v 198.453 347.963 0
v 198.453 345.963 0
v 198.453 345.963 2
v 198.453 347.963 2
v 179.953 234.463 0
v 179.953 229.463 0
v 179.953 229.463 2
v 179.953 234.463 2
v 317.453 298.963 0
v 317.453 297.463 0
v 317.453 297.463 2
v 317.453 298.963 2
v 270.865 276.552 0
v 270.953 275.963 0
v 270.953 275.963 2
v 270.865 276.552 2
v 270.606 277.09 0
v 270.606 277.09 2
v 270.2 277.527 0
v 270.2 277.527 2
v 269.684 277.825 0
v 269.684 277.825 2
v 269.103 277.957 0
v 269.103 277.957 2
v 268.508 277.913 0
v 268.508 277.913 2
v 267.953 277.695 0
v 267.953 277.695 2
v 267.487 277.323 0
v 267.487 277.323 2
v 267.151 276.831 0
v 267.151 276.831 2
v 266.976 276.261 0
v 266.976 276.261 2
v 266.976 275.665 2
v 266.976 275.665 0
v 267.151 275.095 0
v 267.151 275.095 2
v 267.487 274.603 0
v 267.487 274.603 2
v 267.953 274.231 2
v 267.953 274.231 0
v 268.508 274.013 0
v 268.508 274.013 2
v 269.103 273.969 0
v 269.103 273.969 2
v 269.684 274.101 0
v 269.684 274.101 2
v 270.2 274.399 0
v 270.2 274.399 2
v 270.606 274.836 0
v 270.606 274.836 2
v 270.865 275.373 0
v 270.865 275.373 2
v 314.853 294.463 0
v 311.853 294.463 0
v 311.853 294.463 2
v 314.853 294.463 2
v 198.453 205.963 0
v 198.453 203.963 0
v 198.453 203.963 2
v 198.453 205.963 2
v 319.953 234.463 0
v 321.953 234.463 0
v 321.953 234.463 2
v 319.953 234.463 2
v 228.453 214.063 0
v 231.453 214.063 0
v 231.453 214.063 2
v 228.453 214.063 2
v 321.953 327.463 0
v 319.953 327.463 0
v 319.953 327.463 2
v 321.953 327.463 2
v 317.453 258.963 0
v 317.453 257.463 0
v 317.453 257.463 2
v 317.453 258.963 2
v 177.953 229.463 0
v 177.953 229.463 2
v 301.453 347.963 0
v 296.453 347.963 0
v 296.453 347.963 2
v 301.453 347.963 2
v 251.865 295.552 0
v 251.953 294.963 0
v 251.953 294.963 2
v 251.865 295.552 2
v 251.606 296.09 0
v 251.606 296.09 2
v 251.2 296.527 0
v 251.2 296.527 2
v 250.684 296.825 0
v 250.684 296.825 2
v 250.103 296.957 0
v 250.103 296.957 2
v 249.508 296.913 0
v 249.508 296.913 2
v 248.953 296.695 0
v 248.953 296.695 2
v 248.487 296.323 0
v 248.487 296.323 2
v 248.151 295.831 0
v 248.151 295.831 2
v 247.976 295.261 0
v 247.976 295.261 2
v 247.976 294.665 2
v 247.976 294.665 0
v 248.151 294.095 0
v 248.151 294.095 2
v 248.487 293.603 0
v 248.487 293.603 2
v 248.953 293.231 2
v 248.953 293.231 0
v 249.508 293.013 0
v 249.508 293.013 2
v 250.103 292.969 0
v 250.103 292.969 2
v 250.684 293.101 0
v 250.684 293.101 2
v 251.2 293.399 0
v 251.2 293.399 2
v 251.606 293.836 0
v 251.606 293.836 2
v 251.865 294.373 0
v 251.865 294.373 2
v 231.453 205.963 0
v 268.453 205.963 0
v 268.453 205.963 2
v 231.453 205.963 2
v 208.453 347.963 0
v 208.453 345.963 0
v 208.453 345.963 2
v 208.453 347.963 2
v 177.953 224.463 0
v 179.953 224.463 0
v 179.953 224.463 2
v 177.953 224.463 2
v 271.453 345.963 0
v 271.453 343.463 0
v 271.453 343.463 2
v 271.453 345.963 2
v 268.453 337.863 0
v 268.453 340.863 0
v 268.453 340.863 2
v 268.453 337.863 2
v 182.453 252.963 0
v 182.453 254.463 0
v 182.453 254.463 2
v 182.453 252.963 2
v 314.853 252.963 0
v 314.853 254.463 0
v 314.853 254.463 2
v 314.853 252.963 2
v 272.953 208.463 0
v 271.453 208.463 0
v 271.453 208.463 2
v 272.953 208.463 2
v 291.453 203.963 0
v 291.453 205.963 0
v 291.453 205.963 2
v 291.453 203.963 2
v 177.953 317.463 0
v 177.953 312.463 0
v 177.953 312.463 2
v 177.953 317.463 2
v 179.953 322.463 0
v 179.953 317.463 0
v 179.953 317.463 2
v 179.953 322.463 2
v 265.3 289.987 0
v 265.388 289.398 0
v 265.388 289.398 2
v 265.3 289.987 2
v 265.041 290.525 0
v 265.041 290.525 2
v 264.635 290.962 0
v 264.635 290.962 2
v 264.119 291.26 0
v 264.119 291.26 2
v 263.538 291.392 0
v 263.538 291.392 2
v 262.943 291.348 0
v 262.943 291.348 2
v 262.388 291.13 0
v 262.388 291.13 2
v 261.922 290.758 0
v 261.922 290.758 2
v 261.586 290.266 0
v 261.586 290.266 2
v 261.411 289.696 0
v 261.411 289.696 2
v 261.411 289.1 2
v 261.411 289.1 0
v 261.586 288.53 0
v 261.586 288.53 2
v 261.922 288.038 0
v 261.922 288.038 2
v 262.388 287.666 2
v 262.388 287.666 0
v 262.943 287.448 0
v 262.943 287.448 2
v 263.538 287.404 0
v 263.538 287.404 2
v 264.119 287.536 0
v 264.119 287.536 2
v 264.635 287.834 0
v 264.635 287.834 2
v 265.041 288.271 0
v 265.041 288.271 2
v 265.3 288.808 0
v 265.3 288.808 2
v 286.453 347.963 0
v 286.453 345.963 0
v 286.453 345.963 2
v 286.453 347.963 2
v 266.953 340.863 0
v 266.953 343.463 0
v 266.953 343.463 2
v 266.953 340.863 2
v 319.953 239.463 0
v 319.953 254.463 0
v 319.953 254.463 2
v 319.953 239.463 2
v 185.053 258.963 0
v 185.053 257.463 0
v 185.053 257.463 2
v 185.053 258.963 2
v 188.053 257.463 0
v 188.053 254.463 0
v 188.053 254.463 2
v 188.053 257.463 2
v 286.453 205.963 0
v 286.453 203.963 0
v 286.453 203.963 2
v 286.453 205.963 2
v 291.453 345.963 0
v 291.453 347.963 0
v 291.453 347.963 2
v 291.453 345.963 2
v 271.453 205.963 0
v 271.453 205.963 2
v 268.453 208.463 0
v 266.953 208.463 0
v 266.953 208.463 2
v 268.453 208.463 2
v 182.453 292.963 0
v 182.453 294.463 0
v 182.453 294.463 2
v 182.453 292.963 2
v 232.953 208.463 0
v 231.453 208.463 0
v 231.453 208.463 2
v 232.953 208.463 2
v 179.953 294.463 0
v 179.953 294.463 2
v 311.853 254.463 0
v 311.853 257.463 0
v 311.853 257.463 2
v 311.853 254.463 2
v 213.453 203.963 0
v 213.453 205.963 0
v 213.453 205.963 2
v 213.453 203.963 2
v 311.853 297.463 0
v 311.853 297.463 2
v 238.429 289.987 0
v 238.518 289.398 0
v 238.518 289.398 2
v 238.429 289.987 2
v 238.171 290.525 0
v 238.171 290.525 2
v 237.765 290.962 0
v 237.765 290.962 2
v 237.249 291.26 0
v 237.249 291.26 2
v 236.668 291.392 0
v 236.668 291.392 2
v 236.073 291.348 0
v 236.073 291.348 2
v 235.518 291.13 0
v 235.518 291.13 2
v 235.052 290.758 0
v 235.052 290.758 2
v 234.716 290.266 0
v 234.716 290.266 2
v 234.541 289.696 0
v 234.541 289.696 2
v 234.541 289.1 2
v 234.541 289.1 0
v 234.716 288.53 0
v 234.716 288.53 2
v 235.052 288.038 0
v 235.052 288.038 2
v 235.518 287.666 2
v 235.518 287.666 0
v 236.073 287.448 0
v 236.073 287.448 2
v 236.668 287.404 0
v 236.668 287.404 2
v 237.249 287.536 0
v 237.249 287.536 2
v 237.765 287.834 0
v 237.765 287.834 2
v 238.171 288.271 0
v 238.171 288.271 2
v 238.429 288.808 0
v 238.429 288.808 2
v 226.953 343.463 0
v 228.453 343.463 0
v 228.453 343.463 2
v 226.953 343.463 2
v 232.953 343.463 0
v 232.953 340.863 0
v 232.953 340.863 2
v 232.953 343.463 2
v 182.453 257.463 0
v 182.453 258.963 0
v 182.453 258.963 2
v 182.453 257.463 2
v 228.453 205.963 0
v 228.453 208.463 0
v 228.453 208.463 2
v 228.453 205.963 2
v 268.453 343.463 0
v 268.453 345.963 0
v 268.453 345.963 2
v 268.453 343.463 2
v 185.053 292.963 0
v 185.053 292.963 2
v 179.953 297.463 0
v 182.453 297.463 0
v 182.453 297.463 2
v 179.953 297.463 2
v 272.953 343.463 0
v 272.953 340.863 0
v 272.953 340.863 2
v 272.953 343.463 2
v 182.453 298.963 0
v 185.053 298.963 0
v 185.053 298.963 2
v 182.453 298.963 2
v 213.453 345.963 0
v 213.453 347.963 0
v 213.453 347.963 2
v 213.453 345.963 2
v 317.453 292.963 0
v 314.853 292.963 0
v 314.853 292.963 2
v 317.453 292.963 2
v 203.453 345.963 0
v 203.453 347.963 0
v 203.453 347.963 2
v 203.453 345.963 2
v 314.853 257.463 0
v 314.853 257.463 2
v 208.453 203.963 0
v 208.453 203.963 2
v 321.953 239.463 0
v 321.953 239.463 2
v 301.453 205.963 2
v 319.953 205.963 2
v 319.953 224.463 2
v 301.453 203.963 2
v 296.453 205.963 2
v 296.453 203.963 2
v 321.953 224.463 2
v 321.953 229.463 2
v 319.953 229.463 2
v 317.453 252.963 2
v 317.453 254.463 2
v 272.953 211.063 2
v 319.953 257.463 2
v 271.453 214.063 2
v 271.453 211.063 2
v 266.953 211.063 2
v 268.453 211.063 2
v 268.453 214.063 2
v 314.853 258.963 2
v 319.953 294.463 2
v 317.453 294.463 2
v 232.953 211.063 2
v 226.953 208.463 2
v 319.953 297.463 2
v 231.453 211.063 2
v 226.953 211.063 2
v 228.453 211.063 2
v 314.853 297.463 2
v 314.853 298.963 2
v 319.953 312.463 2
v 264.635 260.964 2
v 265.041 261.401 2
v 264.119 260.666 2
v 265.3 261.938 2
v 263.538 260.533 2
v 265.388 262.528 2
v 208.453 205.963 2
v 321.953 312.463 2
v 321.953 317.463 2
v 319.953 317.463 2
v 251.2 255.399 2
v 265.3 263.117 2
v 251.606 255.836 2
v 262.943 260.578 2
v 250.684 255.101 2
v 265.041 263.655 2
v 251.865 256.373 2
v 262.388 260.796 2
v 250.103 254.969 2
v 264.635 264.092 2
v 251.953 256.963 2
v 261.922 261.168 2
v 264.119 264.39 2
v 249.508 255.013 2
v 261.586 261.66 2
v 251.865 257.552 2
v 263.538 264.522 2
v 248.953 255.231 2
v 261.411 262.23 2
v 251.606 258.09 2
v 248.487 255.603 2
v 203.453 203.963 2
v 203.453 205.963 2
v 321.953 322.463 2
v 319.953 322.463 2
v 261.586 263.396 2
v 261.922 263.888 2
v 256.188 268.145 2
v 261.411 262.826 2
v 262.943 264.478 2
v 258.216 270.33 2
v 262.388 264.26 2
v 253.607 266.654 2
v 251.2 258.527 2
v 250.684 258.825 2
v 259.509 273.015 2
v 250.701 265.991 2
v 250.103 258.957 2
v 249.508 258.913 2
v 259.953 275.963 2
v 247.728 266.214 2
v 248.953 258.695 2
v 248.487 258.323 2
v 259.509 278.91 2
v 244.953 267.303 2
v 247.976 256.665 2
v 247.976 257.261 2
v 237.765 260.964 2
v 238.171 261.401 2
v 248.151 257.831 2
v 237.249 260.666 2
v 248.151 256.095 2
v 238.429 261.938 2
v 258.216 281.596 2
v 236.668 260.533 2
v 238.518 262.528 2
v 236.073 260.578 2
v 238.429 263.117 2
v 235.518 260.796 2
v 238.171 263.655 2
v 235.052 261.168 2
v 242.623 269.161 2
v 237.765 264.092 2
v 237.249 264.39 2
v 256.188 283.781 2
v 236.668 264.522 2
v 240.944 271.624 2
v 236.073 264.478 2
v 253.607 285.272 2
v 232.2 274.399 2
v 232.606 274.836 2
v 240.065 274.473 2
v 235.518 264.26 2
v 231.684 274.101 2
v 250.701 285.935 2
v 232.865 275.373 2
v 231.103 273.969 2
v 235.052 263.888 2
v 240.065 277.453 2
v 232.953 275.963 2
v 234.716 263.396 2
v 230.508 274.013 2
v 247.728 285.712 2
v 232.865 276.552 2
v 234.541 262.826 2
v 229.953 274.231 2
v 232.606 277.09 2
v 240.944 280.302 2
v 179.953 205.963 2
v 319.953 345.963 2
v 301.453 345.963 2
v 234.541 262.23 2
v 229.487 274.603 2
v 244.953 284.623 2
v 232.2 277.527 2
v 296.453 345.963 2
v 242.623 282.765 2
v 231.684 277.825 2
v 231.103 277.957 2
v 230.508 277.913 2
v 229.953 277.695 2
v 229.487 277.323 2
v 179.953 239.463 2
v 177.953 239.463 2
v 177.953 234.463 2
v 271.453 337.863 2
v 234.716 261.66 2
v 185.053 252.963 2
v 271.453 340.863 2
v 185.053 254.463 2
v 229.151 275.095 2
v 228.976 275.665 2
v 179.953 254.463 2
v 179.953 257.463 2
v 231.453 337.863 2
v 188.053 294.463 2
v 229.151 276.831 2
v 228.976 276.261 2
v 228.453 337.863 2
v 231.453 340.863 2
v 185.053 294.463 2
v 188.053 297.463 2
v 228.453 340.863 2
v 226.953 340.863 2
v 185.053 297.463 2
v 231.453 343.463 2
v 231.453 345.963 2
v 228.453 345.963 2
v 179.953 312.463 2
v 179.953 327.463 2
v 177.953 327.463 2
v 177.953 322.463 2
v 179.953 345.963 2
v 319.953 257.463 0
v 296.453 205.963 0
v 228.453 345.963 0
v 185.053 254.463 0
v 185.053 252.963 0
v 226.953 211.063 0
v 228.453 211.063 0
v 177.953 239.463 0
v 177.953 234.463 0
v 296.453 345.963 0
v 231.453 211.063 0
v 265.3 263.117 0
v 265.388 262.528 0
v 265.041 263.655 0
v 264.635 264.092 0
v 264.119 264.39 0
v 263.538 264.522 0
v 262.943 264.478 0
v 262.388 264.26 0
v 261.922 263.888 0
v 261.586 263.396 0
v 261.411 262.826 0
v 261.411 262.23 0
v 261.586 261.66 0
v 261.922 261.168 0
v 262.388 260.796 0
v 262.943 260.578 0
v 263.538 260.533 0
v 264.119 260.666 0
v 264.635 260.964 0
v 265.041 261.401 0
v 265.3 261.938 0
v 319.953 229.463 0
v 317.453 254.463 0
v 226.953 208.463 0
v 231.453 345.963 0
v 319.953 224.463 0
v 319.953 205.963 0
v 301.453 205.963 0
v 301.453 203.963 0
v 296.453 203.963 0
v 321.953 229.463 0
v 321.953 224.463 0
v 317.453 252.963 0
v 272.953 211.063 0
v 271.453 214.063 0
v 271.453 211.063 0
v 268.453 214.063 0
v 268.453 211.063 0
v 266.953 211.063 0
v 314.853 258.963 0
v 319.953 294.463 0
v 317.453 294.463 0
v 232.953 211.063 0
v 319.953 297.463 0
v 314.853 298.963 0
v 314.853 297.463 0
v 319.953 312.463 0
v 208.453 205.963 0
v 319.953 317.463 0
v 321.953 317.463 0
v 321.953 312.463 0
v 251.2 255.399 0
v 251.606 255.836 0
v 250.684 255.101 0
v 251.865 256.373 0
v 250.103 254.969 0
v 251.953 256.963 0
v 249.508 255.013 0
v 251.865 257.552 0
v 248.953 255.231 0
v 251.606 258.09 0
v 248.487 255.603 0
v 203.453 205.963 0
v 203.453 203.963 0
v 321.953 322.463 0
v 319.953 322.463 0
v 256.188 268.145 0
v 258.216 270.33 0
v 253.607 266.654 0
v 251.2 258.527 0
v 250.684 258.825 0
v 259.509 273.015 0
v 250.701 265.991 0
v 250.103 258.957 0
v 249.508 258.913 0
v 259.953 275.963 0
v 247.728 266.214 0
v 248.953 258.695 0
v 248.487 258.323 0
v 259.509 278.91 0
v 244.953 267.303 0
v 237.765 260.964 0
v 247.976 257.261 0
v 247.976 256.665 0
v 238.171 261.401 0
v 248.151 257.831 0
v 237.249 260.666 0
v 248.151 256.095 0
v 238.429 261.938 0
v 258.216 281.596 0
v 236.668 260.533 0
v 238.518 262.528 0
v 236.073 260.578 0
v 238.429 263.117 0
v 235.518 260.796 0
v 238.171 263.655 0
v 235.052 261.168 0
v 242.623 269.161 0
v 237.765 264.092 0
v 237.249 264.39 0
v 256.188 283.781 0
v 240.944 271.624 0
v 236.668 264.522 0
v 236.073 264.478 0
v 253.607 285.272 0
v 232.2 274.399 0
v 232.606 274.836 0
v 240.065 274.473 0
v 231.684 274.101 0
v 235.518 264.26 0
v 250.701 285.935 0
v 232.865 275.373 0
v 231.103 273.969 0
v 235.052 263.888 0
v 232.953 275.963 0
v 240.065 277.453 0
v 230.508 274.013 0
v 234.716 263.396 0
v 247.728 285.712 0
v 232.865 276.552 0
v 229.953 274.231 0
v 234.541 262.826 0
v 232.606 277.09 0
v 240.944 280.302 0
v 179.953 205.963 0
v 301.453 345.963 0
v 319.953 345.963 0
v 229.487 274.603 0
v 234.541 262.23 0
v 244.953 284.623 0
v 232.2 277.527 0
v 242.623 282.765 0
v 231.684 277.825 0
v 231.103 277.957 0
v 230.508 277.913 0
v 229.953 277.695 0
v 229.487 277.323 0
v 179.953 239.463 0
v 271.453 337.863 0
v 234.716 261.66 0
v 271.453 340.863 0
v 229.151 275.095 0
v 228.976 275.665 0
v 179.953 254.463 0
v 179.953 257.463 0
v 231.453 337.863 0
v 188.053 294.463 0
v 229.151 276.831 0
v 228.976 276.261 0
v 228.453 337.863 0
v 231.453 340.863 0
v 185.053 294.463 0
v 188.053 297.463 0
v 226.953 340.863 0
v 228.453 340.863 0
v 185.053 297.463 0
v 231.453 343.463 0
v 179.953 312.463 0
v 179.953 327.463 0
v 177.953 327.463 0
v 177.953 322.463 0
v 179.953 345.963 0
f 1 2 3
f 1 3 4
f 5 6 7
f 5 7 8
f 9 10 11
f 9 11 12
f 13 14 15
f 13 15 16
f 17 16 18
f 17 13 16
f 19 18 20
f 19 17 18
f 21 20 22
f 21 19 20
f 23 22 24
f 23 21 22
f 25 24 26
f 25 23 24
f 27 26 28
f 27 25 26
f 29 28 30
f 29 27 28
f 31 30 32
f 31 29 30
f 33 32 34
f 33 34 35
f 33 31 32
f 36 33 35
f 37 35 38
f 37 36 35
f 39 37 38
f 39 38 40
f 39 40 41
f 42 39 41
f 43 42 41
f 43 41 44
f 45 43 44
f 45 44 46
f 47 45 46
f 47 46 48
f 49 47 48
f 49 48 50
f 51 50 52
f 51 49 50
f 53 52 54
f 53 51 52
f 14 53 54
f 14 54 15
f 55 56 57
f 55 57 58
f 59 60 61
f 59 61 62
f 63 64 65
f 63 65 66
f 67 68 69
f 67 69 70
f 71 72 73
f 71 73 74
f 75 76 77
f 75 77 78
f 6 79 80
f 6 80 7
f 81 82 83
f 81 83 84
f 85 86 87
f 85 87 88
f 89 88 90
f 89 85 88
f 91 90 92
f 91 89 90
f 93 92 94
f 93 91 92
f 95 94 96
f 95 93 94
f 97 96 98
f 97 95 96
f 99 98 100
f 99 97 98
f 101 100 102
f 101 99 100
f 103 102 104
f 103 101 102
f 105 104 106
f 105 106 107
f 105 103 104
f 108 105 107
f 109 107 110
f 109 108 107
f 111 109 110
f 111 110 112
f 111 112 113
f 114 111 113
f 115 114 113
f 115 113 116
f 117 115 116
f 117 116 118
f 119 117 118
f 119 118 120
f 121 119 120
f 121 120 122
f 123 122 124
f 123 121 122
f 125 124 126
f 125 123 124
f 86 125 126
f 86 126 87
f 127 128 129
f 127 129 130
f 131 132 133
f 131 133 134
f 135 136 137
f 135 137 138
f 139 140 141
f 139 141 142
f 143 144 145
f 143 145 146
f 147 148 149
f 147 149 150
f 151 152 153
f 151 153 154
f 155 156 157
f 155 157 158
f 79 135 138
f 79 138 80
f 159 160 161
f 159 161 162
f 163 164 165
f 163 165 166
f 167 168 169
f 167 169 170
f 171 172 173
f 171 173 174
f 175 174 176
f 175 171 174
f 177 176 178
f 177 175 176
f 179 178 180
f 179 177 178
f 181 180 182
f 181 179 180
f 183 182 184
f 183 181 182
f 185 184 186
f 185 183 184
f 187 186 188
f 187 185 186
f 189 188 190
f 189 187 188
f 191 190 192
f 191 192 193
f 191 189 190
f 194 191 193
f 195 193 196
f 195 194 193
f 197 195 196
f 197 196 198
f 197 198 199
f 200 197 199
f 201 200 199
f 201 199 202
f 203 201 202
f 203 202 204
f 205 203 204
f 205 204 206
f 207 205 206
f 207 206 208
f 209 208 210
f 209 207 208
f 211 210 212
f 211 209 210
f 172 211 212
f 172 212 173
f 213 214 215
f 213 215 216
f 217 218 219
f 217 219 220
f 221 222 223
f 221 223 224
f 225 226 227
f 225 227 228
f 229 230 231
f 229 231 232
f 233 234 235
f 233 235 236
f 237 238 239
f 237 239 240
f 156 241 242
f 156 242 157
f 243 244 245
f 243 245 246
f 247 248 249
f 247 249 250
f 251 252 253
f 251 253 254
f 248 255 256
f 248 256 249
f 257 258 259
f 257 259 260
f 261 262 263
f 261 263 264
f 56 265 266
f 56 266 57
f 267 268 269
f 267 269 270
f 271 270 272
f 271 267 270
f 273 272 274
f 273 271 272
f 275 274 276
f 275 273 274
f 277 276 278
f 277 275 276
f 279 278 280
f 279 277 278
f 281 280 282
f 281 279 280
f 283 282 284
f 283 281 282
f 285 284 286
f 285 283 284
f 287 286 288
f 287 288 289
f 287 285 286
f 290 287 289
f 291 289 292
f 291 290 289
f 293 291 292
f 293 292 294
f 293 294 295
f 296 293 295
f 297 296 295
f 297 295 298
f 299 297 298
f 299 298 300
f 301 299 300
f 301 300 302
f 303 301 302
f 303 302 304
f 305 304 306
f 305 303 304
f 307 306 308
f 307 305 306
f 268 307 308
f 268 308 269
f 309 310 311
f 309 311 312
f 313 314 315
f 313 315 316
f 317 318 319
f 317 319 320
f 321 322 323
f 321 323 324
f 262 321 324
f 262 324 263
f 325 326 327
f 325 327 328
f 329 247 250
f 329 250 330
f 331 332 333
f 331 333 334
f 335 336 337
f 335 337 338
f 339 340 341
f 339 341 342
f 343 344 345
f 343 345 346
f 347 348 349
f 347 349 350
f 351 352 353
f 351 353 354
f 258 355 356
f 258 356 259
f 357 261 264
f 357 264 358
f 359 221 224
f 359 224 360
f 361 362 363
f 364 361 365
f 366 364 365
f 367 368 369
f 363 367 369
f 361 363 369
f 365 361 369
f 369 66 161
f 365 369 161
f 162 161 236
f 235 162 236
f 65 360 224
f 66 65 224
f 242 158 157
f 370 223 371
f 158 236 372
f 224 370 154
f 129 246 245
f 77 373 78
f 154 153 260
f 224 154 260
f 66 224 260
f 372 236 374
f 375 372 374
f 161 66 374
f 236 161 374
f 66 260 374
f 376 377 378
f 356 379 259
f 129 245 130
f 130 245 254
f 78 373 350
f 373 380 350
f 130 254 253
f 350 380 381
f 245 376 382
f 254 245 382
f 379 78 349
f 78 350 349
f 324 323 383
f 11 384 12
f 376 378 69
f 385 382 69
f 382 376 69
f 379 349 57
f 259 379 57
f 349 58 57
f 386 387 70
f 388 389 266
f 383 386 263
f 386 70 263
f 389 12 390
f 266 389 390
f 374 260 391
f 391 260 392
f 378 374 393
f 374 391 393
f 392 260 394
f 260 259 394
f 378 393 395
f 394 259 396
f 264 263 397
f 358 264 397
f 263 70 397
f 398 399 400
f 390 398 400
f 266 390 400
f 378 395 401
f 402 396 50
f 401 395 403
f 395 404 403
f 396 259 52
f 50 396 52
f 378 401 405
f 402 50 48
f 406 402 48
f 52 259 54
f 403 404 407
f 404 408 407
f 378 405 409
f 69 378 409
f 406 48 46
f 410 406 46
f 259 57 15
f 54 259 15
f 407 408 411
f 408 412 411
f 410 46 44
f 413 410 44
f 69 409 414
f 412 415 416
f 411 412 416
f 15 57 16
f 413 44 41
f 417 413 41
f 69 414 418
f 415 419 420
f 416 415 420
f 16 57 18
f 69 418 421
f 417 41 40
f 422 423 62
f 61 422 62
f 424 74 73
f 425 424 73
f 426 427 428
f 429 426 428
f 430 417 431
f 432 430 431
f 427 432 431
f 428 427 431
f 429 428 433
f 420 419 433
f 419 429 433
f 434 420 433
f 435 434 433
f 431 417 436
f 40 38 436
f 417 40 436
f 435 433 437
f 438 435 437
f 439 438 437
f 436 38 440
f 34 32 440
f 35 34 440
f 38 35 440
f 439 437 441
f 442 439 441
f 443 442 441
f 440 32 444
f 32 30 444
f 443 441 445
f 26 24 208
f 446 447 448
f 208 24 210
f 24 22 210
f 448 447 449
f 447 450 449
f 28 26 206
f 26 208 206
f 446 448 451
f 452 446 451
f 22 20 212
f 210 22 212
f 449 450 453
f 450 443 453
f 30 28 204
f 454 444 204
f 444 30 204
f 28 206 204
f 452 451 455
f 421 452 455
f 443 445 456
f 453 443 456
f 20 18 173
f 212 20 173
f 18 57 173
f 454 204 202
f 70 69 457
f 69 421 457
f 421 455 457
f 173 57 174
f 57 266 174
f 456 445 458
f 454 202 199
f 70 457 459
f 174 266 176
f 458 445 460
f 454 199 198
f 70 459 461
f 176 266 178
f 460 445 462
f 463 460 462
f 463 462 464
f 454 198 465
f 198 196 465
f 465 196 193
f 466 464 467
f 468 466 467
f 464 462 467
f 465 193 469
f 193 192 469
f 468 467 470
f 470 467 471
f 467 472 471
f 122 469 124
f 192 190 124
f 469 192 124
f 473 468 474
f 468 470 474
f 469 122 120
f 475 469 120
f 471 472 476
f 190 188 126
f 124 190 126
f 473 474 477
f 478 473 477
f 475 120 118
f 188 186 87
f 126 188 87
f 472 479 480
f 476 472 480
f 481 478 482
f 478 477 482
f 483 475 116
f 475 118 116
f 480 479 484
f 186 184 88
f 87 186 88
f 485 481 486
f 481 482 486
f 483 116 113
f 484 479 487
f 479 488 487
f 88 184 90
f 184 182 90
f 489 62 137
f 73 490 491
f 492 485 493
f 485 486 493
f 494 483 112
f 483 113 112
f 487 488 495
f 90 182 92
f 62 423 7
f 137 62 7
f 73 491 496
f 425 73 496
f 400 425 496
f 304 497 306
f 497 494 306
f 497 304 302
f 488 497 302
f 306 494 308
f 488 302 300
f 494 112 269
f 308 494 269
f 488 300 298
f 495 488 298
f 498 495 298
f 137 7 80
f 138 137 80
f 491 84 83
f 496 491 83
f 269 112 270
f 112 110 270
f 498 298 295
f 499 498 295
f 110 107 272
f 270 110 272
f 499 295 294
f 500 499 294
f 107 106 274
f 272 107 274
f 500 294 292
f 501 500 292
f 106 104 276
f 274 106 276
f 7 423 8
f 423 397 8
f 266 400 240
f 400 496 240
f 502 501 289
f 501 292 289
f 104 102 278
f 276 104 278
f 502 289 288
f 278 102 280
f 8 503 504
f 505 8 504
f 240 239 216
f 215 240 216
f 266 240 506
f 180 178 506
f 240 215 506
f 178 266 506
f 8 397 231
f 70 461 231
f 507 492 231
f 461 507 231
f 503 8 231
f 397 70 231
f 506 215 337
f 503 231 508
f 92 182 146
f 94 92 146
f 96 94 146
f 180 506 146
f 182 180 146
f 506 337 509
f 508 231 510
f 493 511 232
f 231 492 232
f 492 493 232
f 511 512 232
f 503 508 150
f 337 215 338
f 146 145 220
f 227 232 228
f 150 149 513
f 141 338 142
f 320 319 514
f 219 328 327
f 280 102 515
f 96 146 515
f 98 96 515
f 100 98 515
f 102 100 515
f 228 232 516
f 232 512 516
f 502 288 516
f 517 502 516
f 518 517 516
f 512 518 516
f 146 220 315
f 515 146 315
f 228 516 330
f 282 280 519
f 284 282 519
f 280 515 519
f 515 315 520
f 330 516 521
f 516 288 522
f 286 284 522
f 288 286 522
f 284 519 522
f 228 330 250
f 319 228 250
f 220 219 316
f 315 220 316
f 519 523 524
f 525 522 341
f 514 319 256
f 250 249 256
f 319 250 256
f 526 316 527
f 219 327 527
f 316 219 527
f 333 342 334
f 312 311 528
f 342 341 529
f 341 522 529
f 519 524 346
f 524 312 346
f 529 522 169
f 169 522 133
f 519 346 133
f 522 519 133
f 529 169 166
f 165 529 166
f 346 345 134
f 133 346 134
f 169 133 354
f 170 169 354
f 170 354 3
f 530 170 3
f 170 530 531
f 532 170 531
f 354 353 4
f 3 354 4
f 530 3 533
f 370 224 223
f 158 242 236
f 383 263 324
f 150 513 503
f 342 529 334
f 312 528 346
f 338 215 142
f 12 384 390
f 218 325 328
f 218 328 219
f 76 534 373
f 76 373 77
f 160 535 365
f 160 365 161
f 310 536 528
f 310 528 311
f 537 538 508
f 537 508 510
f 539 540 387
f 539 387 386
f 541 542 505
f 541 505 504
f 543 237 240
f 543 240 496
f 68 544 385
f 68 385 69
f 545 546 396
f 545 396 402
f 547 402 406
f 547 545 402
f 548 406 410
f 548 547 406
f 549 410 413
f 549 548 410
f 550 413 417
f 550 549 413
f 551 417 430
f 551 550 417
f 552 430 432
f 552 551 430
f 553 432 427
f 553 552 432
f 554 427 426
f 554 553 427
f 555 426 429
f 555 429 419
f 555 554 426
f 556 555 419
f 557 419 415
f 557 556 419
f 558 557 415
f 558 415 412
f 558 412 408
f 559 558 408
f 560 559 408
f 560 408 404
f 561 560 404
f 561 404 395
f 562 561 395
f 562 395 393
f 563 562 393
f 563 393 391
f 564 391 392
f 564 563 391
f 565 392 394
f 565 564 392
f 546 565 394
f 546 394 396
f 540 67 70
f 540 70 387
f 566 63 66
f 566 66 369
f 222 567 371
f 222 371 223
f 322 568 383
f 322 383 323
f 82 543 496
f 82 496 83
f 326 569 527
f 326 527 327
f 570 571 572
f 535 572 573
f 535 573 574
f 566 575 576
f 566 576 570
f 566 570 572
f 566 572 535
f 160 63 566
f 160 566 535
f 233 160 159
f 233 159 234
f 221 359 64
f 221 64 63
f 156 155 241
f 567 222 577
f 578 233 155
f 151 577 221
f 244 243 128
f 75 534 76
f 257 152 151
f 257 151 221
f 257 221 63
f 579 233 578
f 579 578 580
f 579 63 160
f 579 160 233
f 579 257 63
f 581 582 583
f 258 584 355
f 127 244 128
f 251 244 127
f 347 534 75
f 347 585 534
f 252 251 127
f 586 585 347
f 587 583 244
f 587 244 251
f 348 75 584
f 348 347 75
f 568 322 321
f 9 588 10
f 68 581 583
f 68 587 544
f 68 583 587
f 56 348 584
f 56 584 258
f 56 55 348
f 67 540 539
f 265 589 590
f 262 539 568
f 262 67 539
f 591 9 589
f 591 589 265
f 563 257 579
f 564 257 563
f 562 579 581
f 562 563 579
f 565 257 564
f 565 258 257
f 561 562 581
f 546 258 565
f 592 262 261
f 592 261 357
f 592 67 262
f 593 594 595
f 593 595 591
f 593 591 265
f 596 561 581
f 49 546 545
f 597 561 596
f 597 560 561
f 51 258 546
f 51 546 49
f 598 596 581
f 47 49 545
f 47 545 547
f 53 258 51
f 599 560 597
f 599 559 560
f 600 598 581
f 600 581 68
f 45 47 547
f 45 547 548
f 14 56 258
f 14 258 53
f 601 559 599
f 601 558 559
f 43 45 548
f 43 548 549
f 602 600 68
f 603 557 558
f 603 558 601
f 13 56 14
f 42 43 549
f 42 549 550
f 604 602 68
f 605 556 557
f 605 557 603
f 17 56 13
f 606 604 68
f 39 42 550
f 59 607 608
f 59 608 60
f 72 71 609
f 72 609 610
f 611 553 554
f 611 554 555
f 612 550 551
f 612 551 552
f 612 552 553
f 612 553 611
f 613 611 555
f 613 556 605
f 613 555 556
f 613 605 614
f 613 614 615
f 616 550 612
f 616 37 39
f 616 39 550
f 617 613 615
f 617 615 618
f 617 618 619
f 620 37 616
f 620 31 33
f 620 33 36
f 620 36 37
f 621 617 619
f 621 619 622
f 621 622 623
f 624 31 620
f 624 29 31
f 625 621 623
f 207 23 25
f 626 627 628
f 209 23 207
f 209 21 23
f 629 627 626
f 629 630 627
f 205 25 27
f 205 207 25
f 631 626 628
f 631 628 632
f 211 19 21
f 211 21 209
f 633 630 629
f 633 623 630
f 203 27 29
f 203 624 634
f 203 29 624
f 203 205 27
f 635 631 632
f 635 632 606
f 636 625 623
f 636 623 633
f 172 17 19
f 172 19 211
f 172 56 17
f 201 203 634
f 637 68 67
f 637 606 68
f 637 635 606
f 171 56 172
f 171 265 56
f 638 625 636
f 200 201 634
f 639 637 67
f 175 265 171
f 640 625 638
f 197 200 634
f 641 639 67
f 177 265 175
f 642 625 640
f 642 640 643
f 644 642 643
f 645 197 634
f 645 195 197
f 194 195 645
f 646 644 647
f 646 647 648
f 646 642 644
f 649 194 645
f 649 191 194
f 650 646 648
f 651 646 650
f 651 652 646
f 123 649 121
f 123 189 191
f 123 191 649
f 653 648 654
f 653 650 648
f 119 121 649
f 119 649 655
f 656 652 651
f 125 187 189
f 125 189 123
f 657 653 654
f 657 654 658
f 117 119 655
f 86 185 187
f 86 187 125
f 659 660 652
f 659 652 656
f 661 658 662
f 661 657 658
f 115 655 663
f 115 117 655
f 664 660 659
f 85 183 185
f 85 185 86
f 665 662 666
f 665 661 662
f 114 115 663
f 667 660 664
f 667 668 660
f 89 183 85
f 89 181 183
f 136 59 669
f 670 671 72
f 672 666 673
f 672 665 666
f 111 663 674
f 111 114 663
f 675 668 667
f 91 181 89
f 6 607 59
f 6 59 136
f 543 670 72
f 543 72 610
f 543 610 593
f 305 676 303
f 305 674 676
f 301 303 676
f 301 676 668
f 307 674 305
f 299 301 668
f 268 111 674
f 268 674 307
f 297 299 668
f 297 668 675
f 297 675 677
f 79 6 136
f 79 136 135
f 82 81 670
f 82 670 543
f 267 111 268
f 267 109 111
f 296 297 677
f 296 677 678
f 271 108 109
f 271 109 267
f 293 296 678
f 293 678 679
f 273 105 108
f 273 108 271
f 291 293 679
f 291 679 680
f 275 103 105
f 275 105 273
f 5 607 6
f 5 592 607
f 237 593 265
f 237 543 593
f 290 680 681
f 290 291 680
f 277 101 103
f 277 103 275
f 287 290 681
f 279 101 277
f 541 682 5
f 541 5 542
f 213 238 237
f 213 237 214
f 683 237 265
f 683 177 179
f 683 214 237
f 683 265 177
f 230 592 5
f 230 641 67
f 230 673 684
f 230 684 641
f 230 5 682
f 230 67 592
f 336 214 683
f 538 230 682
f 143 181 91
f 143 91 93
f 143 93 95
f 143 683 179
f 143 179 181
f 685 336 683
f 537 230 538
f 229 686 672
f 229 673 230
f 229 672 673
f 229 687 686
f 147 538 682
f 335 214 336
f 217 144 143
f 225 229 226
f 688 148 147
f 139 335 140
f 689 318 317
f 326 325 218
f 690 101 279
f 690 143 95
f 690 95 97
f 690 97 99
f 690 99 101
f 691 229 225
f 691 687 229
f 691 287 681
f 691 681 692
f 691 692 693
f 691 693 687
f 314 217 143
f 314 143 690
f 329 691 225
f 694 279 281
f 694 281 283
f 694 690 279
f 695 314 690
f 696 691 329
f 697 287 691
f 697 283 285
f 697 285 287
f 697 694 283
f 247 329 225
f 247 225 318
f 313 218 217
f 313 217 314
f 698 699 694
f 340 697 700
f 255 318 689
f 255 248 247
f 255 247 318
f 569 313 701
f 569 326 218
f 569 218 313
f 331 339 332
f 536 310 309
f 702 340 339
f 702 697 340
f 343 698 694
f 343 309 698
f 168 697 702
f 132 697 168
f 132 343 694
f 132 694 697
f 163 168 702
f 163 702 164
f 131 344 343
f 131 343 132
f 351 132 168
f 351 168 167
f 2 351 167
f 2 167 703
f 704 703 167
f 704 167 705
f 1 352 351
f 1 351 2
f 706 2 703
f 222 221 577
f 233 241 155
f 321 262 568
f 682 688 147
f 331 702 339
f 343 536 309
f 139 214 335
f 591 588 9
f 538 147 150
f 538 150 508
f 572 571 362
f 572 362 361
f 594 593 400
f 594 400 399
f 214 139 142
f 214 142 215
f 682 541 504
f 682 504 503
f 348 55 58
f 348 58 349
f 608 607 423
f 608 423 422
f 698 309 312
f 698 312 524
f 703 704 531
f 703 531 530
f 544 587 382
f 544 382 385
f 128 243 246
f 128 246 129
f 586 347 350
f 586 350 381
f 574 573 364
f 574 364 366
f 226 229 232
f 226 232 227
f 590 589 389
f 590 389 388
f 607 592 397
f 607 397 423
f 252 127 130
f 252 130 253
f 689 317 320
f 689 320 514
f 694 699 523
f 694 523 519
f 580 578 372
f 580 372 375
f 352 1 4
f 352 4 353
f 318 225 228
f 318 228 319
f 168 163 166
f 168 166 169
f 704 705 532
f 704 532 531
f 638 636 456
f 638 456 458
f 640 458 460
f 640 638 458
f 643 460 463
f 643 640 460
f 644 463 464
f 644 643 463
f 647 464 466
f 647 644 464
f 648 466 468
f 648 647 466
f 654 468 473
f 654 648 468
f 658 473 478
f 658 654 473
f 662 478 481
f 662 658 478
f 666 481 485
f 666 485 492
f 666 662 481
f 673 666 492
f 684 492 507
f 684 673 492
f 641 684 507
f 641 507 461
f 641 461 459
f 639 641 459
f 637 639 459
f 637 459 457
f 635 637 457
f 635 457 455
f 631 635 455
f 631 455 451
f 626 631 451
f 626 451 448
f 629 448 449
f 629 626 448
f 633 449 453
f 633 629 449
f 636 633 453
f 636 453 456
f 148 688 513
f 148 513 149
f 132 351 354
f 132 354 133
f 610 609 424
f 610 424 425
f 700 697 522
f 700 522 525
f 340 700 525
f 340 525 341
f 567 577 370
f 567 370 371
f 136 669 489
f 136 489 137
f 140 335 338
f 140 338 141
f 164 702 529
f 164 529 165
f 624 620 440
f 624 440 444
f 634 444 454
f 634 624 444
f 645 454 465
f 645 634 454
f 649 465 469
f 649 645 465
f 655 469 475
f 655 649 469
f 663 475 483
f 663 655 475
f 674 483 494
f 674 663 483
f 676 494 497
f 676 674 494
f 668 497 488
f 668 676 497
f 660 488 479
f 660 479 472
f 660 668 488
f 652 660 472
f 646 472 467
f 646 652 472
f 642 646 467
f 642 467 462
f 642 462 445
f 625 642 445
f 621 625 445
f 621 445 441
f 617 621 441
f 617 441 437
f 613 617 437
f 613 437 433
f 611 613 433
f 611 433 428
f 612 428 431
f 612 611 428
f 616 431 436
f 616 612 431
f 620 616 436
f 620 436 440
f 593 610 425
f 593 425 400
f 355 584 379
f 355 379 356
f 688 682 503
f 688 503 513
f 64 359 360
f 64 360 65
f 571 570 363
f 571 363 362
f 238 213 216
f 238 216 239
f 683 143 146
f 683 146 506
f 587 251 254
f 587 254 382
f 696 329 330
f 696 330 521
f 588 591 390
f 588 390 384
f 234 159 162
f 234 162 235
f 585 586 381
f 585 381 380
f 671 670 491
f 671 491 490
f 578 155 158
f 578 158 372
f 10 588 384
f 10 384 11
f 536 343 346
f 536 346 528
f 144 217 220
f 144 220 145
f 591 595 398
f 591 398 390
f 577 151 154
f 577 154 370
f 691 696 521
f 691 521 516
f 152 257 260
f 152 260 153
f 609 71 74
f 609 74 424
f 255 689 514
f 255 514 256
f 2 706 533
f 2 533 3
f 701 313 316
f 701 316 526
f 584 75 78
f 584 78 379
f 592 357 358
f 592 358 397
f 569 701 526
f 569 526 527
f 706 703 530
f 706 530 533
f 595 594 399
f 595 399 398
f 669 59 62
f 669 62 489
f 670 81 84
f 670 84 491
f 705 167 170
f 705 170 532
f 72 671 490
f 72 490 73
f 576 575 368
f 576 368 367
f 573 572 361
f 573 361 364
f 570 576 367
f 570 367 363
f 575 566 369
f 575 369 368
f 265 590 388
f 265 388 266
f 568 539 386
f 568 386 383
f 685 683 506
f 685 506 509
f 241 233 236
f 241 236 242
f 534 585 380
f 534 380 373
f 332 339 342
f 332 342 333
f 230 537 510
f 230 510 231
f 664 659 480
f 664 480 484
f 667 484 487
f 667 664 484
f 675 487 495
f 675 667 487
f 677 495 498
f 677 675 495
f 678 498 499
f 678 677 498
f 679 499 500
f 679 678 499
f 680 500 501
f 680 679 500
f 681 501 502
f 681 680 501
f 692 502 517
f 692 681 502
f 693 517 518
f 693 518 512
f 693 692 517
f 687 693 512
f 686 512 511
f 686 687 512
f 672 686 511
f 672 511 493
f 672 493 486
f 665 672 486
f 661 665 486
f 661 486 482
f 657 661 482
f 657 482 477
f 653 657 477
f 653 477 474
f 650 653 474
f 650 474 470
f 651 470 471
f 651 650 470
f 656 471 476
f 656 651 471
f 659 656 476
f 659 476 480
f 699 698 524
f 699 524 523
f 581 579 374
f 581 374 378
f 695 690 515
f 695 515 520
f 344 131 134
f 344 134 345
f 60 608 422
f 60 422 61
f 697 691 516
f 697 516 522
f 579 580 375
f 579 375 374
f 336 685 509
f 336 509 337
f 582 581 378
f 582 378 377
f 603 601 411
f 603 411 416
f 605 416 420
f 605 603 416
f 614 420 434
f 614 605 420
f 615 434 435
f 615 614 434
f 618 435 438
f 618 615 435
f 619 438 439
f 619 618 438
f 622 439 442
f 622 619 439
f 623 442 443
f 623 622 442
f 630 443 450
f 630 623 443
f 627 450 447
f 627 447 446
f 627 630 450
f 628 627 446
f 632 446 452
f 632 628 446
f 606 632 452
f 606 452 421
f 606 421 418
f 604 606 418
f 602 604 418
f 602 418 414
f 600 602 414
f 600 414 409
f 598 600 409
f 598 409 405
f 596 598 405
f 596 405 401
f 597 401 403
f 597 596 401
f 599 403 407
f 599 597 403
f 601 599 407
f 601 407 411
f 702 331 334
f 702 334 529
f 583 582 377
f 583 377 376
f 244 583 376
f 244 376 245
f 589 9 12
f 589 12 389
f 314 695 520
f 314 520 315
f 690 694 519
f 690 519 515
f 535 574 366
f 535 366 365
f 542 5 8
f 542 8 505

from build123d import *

# Parameters (mm, degrees)
SKETCH_1_R      = 10
SKETCH_1_R_2    = 2
EXTRUDE_1_DEPTH = 2


with BuildPart() as part:
    # 草图1 → 凸台-拉伸1 (new body)
    with BuildSketch(Plane.XY):
        Polygon((317.453360513, 257.462931603), (317.453360513, 258.962931603), (314.853360513, 258.962931603), (314.853360513, 257.462931603), (311.853360513, 257.462931603), (311.853360513, 254.462931603), (314.853360513, 254.462931603), (314.853360513, 252.962931603), (317.453360513, 252.962931603), (317.453360513, 254.462931603), (319.953360513, 254.462931603), (319.953360513, 239.462931603), (321.953360513, 239.462931603), (321.953360513, 234.462931603), (319.953360513, 234.462931603), (319.953360513, 229.462931603), (321.953360513, 229.462931603), (321.953360513, 224.462931603), (319.953360513, 224.462931603), (319.953360513, 205.962931603), (301.453360513, 205.962931603), (301.453360513, 203.962931603), (296.453360513, 203.962931603), (296.453360513, 205.962931603), (291.453360513, 205.962931603), (291.453360513, 203.962931603), (286.453360513, 203.962931603), (286.453360513, 205.962931603), (271.453360513, 205.962931603), (271.453360513, 208.462931603), (272.953360513, 208.462931603), (272.953360513, 211.062931603), (271.453360513, 211.062931603), (271.453360513, 214.062931603), (268.453360513, 214.062931603), (268.453360513, 211.062931603), (266.953360513, 211.062931603), (266.953360513, 208.462931603), (268.453360513, 208.462931603), (268.453360513, 205.962931603), (231.453360513, 205.962931603), (231.453360513, 208.462931603), (232.953360513, 208.462931603), (232.953360513, 211.062931603), (231.453360513, 211.062931603), (231.453360513, 214.062931603), (228.453360513, 214.062931603), (228.453360513, 211.062931603), (226.953360513, 211.062931603), (226.953360513, 208.462931603), (228.453360513, 208.462931603), (228.453360513, 205.962931603), (213.453360513, 205.962931603), (213.453360513, 203.962931603), (208.453360513, 203.962931603), (208.453360513, 205.962931603), (203.453360513, 205.962931603), (203.453360513, 203.962931603), (198.453360513, 203.962931603), (198.453360513, 205.962931603), (179.953360513, 205.962931603), (179.953360513, 224.462931603), (177.953360513, 224.462931603), (177.953360513, 229.462931603), (179.953360513, 229.462931603), (179.953360513, 234.462931603), (177.953360513, 234.462931603), (177.953360513, 239.462931603), (179.953360513, 239.462931603), (179.953360513, 254.462931603), (182.453360513, 254.462931603), (182.453360513, 252.962931603), (185.053360513, 252.962931603), (185.053360513, 254.462931603), (188.053360513, 254.462931603), (188.053360513, 257.462931603), (185.053360513, 257.462931603), (185.053360513, 258.962931603), (182.453360513, 258.962931603), (182.453360513, 257.462931603), (179.953360513, 257.462931603), (179.953360513, 294.462931603), (182.453360513, 294.462931603), (182.453360513, 292.962931603), (185.053360513, 292.962931603), (185.053360513, 294.462931603), (188.053360513, 294.462931603), (188.053360513, 297.462931603), (185.053360513, 297.462931603), (185.053360513, 298.962931603), (182.453360513, 298.962931603), (182.453360513, 297.462931603), (179.953360513, 297.462931603), (179.953360513, 312.462931603), (177.953360513, 312.462931603), (177.953360513, 317.462931603), (179.953360513, 317.462931603), (179.953360513, 322.462931603), (177.953360513, 322.462931603), (177.953360513, 327.462931603), (179.953360513, 327.462931603), (179.953360513, 345.962931603), (198.453360513, 345.962931603), (198.453360513, 347.962931603), (203.453360513, 347.962931603), (203.453360513, 345.962931603), (208.453360513, 345.962931603), (208.453360513, 347.962931603), (213.453360513, 347.962931603), (213.453360513, 345.962931603), (228.453360513, 345.962931603), (228.453360513, 343.462931603), (226.953360513, 343.462931603), (226.953360513, 340.862931603), (228.453360513, 340.862931603), (228.453360513, 337.862931603), (231.453360513, 337.862931603), (231.453360513, 340.862931603), (232.953360513, 340.862931603), (232.953360513, 343.462931603), (231.453360513, 343.462931603), (231.453360513, 345.962931603), (268.453360513, 345.962931603), (268.453360513, 343.462931603), (266.953360513, 343.462931603), (266.953360513, 340.862931603), (268.453360513, 340.862931603), (268.453360513, 337.862931603), (271.453360513, 337.862931603), (271.453360513, 340.862931603), (272.953360513, 340.862931603), (272.953360513, 343.462931603), (271.453360513, 343.462931603), (271.453360513, 345.962931603), (286.453360513, 345.962931603), (286.453360513, 347.962931603), (291.453360513, 347.962931603), (291.453360513, 345.962931603), (296.453360513, 345.962931603), (296.453360513, 347.962931603), (301.453360513, 347.962931603), (301.453360513, 345.962931603), (319.953360513, 345.962931603), (319.953360513, 327.462931603), (321.953360513, 327.462931603), (321.953360513, 322.462931603), (319.953360513, 322.462931603), (319.953360513, 317.462931603), (321.953360513, 317.462931603), (321.953360513, 312.462931603), (319.953360513, 312.462931603), (319.953360513, 297.462931603), (317.453360513, 297.462931603), (317.453360513, 298.962931603), (314.853360513, 298.962931603), (314.853360513, 297.462931603), (311.853360513, 297.462931603), (311.853360513, 294.462931603), (314.853360513, 294.462931603), (314.853360513, 292.962931603), (317.453360513, 292.962931603), (317.453360513, 294.462931603), (319.953360513, 294.462931603), (319.953360513, 257.462931603), align=None)
        with Locations((249.953360513, 275.962931603)):
            Circle(SKETCH_1_R, mode=Mode.SUBTRACT)
        with Locations((230.953360513, 275.962931603)):
            Circle(SKETCH_1_R_2, mode=Mode.SUBTRACT)
        with Locations((236.518331671, 289.397960445)):
            Circle(SKETCH_1_R_2, mode=Mode.SUBTRACT)
        with Locations((249.953360513, 294.962931603)):
            Circle(SKETCH_1_R_2, mode=Mode.SUBTRACT)
        with Locations((263.388389356, 289.397960445)):
            Circle(SKETCH_1_R_2, mode=Mode.SUBTRACT)
        with Locations((268.953360513, 275.962931603)):
            Circle(SKETCH_1_R_2, mode=Mode.SUBTRACT)
        with Locations((263.388389356, 262.52790276)):
            Circle(SKETCH_1_R_2, mode=Mode.SUBTRACT)
        with Locations((249.953360513, 256.962931603)):
            Circle(SKETCH_1_R_2, mode=Mode.SUBTRACT)
        with Locations((236.518331671, 262.52790276)):
            Circle(SKETCH_1_R_2, mode=Mode.SUBTRACT)
    extrude(amount=EXTRUDE_1_DEPTH)


solid = part.part
